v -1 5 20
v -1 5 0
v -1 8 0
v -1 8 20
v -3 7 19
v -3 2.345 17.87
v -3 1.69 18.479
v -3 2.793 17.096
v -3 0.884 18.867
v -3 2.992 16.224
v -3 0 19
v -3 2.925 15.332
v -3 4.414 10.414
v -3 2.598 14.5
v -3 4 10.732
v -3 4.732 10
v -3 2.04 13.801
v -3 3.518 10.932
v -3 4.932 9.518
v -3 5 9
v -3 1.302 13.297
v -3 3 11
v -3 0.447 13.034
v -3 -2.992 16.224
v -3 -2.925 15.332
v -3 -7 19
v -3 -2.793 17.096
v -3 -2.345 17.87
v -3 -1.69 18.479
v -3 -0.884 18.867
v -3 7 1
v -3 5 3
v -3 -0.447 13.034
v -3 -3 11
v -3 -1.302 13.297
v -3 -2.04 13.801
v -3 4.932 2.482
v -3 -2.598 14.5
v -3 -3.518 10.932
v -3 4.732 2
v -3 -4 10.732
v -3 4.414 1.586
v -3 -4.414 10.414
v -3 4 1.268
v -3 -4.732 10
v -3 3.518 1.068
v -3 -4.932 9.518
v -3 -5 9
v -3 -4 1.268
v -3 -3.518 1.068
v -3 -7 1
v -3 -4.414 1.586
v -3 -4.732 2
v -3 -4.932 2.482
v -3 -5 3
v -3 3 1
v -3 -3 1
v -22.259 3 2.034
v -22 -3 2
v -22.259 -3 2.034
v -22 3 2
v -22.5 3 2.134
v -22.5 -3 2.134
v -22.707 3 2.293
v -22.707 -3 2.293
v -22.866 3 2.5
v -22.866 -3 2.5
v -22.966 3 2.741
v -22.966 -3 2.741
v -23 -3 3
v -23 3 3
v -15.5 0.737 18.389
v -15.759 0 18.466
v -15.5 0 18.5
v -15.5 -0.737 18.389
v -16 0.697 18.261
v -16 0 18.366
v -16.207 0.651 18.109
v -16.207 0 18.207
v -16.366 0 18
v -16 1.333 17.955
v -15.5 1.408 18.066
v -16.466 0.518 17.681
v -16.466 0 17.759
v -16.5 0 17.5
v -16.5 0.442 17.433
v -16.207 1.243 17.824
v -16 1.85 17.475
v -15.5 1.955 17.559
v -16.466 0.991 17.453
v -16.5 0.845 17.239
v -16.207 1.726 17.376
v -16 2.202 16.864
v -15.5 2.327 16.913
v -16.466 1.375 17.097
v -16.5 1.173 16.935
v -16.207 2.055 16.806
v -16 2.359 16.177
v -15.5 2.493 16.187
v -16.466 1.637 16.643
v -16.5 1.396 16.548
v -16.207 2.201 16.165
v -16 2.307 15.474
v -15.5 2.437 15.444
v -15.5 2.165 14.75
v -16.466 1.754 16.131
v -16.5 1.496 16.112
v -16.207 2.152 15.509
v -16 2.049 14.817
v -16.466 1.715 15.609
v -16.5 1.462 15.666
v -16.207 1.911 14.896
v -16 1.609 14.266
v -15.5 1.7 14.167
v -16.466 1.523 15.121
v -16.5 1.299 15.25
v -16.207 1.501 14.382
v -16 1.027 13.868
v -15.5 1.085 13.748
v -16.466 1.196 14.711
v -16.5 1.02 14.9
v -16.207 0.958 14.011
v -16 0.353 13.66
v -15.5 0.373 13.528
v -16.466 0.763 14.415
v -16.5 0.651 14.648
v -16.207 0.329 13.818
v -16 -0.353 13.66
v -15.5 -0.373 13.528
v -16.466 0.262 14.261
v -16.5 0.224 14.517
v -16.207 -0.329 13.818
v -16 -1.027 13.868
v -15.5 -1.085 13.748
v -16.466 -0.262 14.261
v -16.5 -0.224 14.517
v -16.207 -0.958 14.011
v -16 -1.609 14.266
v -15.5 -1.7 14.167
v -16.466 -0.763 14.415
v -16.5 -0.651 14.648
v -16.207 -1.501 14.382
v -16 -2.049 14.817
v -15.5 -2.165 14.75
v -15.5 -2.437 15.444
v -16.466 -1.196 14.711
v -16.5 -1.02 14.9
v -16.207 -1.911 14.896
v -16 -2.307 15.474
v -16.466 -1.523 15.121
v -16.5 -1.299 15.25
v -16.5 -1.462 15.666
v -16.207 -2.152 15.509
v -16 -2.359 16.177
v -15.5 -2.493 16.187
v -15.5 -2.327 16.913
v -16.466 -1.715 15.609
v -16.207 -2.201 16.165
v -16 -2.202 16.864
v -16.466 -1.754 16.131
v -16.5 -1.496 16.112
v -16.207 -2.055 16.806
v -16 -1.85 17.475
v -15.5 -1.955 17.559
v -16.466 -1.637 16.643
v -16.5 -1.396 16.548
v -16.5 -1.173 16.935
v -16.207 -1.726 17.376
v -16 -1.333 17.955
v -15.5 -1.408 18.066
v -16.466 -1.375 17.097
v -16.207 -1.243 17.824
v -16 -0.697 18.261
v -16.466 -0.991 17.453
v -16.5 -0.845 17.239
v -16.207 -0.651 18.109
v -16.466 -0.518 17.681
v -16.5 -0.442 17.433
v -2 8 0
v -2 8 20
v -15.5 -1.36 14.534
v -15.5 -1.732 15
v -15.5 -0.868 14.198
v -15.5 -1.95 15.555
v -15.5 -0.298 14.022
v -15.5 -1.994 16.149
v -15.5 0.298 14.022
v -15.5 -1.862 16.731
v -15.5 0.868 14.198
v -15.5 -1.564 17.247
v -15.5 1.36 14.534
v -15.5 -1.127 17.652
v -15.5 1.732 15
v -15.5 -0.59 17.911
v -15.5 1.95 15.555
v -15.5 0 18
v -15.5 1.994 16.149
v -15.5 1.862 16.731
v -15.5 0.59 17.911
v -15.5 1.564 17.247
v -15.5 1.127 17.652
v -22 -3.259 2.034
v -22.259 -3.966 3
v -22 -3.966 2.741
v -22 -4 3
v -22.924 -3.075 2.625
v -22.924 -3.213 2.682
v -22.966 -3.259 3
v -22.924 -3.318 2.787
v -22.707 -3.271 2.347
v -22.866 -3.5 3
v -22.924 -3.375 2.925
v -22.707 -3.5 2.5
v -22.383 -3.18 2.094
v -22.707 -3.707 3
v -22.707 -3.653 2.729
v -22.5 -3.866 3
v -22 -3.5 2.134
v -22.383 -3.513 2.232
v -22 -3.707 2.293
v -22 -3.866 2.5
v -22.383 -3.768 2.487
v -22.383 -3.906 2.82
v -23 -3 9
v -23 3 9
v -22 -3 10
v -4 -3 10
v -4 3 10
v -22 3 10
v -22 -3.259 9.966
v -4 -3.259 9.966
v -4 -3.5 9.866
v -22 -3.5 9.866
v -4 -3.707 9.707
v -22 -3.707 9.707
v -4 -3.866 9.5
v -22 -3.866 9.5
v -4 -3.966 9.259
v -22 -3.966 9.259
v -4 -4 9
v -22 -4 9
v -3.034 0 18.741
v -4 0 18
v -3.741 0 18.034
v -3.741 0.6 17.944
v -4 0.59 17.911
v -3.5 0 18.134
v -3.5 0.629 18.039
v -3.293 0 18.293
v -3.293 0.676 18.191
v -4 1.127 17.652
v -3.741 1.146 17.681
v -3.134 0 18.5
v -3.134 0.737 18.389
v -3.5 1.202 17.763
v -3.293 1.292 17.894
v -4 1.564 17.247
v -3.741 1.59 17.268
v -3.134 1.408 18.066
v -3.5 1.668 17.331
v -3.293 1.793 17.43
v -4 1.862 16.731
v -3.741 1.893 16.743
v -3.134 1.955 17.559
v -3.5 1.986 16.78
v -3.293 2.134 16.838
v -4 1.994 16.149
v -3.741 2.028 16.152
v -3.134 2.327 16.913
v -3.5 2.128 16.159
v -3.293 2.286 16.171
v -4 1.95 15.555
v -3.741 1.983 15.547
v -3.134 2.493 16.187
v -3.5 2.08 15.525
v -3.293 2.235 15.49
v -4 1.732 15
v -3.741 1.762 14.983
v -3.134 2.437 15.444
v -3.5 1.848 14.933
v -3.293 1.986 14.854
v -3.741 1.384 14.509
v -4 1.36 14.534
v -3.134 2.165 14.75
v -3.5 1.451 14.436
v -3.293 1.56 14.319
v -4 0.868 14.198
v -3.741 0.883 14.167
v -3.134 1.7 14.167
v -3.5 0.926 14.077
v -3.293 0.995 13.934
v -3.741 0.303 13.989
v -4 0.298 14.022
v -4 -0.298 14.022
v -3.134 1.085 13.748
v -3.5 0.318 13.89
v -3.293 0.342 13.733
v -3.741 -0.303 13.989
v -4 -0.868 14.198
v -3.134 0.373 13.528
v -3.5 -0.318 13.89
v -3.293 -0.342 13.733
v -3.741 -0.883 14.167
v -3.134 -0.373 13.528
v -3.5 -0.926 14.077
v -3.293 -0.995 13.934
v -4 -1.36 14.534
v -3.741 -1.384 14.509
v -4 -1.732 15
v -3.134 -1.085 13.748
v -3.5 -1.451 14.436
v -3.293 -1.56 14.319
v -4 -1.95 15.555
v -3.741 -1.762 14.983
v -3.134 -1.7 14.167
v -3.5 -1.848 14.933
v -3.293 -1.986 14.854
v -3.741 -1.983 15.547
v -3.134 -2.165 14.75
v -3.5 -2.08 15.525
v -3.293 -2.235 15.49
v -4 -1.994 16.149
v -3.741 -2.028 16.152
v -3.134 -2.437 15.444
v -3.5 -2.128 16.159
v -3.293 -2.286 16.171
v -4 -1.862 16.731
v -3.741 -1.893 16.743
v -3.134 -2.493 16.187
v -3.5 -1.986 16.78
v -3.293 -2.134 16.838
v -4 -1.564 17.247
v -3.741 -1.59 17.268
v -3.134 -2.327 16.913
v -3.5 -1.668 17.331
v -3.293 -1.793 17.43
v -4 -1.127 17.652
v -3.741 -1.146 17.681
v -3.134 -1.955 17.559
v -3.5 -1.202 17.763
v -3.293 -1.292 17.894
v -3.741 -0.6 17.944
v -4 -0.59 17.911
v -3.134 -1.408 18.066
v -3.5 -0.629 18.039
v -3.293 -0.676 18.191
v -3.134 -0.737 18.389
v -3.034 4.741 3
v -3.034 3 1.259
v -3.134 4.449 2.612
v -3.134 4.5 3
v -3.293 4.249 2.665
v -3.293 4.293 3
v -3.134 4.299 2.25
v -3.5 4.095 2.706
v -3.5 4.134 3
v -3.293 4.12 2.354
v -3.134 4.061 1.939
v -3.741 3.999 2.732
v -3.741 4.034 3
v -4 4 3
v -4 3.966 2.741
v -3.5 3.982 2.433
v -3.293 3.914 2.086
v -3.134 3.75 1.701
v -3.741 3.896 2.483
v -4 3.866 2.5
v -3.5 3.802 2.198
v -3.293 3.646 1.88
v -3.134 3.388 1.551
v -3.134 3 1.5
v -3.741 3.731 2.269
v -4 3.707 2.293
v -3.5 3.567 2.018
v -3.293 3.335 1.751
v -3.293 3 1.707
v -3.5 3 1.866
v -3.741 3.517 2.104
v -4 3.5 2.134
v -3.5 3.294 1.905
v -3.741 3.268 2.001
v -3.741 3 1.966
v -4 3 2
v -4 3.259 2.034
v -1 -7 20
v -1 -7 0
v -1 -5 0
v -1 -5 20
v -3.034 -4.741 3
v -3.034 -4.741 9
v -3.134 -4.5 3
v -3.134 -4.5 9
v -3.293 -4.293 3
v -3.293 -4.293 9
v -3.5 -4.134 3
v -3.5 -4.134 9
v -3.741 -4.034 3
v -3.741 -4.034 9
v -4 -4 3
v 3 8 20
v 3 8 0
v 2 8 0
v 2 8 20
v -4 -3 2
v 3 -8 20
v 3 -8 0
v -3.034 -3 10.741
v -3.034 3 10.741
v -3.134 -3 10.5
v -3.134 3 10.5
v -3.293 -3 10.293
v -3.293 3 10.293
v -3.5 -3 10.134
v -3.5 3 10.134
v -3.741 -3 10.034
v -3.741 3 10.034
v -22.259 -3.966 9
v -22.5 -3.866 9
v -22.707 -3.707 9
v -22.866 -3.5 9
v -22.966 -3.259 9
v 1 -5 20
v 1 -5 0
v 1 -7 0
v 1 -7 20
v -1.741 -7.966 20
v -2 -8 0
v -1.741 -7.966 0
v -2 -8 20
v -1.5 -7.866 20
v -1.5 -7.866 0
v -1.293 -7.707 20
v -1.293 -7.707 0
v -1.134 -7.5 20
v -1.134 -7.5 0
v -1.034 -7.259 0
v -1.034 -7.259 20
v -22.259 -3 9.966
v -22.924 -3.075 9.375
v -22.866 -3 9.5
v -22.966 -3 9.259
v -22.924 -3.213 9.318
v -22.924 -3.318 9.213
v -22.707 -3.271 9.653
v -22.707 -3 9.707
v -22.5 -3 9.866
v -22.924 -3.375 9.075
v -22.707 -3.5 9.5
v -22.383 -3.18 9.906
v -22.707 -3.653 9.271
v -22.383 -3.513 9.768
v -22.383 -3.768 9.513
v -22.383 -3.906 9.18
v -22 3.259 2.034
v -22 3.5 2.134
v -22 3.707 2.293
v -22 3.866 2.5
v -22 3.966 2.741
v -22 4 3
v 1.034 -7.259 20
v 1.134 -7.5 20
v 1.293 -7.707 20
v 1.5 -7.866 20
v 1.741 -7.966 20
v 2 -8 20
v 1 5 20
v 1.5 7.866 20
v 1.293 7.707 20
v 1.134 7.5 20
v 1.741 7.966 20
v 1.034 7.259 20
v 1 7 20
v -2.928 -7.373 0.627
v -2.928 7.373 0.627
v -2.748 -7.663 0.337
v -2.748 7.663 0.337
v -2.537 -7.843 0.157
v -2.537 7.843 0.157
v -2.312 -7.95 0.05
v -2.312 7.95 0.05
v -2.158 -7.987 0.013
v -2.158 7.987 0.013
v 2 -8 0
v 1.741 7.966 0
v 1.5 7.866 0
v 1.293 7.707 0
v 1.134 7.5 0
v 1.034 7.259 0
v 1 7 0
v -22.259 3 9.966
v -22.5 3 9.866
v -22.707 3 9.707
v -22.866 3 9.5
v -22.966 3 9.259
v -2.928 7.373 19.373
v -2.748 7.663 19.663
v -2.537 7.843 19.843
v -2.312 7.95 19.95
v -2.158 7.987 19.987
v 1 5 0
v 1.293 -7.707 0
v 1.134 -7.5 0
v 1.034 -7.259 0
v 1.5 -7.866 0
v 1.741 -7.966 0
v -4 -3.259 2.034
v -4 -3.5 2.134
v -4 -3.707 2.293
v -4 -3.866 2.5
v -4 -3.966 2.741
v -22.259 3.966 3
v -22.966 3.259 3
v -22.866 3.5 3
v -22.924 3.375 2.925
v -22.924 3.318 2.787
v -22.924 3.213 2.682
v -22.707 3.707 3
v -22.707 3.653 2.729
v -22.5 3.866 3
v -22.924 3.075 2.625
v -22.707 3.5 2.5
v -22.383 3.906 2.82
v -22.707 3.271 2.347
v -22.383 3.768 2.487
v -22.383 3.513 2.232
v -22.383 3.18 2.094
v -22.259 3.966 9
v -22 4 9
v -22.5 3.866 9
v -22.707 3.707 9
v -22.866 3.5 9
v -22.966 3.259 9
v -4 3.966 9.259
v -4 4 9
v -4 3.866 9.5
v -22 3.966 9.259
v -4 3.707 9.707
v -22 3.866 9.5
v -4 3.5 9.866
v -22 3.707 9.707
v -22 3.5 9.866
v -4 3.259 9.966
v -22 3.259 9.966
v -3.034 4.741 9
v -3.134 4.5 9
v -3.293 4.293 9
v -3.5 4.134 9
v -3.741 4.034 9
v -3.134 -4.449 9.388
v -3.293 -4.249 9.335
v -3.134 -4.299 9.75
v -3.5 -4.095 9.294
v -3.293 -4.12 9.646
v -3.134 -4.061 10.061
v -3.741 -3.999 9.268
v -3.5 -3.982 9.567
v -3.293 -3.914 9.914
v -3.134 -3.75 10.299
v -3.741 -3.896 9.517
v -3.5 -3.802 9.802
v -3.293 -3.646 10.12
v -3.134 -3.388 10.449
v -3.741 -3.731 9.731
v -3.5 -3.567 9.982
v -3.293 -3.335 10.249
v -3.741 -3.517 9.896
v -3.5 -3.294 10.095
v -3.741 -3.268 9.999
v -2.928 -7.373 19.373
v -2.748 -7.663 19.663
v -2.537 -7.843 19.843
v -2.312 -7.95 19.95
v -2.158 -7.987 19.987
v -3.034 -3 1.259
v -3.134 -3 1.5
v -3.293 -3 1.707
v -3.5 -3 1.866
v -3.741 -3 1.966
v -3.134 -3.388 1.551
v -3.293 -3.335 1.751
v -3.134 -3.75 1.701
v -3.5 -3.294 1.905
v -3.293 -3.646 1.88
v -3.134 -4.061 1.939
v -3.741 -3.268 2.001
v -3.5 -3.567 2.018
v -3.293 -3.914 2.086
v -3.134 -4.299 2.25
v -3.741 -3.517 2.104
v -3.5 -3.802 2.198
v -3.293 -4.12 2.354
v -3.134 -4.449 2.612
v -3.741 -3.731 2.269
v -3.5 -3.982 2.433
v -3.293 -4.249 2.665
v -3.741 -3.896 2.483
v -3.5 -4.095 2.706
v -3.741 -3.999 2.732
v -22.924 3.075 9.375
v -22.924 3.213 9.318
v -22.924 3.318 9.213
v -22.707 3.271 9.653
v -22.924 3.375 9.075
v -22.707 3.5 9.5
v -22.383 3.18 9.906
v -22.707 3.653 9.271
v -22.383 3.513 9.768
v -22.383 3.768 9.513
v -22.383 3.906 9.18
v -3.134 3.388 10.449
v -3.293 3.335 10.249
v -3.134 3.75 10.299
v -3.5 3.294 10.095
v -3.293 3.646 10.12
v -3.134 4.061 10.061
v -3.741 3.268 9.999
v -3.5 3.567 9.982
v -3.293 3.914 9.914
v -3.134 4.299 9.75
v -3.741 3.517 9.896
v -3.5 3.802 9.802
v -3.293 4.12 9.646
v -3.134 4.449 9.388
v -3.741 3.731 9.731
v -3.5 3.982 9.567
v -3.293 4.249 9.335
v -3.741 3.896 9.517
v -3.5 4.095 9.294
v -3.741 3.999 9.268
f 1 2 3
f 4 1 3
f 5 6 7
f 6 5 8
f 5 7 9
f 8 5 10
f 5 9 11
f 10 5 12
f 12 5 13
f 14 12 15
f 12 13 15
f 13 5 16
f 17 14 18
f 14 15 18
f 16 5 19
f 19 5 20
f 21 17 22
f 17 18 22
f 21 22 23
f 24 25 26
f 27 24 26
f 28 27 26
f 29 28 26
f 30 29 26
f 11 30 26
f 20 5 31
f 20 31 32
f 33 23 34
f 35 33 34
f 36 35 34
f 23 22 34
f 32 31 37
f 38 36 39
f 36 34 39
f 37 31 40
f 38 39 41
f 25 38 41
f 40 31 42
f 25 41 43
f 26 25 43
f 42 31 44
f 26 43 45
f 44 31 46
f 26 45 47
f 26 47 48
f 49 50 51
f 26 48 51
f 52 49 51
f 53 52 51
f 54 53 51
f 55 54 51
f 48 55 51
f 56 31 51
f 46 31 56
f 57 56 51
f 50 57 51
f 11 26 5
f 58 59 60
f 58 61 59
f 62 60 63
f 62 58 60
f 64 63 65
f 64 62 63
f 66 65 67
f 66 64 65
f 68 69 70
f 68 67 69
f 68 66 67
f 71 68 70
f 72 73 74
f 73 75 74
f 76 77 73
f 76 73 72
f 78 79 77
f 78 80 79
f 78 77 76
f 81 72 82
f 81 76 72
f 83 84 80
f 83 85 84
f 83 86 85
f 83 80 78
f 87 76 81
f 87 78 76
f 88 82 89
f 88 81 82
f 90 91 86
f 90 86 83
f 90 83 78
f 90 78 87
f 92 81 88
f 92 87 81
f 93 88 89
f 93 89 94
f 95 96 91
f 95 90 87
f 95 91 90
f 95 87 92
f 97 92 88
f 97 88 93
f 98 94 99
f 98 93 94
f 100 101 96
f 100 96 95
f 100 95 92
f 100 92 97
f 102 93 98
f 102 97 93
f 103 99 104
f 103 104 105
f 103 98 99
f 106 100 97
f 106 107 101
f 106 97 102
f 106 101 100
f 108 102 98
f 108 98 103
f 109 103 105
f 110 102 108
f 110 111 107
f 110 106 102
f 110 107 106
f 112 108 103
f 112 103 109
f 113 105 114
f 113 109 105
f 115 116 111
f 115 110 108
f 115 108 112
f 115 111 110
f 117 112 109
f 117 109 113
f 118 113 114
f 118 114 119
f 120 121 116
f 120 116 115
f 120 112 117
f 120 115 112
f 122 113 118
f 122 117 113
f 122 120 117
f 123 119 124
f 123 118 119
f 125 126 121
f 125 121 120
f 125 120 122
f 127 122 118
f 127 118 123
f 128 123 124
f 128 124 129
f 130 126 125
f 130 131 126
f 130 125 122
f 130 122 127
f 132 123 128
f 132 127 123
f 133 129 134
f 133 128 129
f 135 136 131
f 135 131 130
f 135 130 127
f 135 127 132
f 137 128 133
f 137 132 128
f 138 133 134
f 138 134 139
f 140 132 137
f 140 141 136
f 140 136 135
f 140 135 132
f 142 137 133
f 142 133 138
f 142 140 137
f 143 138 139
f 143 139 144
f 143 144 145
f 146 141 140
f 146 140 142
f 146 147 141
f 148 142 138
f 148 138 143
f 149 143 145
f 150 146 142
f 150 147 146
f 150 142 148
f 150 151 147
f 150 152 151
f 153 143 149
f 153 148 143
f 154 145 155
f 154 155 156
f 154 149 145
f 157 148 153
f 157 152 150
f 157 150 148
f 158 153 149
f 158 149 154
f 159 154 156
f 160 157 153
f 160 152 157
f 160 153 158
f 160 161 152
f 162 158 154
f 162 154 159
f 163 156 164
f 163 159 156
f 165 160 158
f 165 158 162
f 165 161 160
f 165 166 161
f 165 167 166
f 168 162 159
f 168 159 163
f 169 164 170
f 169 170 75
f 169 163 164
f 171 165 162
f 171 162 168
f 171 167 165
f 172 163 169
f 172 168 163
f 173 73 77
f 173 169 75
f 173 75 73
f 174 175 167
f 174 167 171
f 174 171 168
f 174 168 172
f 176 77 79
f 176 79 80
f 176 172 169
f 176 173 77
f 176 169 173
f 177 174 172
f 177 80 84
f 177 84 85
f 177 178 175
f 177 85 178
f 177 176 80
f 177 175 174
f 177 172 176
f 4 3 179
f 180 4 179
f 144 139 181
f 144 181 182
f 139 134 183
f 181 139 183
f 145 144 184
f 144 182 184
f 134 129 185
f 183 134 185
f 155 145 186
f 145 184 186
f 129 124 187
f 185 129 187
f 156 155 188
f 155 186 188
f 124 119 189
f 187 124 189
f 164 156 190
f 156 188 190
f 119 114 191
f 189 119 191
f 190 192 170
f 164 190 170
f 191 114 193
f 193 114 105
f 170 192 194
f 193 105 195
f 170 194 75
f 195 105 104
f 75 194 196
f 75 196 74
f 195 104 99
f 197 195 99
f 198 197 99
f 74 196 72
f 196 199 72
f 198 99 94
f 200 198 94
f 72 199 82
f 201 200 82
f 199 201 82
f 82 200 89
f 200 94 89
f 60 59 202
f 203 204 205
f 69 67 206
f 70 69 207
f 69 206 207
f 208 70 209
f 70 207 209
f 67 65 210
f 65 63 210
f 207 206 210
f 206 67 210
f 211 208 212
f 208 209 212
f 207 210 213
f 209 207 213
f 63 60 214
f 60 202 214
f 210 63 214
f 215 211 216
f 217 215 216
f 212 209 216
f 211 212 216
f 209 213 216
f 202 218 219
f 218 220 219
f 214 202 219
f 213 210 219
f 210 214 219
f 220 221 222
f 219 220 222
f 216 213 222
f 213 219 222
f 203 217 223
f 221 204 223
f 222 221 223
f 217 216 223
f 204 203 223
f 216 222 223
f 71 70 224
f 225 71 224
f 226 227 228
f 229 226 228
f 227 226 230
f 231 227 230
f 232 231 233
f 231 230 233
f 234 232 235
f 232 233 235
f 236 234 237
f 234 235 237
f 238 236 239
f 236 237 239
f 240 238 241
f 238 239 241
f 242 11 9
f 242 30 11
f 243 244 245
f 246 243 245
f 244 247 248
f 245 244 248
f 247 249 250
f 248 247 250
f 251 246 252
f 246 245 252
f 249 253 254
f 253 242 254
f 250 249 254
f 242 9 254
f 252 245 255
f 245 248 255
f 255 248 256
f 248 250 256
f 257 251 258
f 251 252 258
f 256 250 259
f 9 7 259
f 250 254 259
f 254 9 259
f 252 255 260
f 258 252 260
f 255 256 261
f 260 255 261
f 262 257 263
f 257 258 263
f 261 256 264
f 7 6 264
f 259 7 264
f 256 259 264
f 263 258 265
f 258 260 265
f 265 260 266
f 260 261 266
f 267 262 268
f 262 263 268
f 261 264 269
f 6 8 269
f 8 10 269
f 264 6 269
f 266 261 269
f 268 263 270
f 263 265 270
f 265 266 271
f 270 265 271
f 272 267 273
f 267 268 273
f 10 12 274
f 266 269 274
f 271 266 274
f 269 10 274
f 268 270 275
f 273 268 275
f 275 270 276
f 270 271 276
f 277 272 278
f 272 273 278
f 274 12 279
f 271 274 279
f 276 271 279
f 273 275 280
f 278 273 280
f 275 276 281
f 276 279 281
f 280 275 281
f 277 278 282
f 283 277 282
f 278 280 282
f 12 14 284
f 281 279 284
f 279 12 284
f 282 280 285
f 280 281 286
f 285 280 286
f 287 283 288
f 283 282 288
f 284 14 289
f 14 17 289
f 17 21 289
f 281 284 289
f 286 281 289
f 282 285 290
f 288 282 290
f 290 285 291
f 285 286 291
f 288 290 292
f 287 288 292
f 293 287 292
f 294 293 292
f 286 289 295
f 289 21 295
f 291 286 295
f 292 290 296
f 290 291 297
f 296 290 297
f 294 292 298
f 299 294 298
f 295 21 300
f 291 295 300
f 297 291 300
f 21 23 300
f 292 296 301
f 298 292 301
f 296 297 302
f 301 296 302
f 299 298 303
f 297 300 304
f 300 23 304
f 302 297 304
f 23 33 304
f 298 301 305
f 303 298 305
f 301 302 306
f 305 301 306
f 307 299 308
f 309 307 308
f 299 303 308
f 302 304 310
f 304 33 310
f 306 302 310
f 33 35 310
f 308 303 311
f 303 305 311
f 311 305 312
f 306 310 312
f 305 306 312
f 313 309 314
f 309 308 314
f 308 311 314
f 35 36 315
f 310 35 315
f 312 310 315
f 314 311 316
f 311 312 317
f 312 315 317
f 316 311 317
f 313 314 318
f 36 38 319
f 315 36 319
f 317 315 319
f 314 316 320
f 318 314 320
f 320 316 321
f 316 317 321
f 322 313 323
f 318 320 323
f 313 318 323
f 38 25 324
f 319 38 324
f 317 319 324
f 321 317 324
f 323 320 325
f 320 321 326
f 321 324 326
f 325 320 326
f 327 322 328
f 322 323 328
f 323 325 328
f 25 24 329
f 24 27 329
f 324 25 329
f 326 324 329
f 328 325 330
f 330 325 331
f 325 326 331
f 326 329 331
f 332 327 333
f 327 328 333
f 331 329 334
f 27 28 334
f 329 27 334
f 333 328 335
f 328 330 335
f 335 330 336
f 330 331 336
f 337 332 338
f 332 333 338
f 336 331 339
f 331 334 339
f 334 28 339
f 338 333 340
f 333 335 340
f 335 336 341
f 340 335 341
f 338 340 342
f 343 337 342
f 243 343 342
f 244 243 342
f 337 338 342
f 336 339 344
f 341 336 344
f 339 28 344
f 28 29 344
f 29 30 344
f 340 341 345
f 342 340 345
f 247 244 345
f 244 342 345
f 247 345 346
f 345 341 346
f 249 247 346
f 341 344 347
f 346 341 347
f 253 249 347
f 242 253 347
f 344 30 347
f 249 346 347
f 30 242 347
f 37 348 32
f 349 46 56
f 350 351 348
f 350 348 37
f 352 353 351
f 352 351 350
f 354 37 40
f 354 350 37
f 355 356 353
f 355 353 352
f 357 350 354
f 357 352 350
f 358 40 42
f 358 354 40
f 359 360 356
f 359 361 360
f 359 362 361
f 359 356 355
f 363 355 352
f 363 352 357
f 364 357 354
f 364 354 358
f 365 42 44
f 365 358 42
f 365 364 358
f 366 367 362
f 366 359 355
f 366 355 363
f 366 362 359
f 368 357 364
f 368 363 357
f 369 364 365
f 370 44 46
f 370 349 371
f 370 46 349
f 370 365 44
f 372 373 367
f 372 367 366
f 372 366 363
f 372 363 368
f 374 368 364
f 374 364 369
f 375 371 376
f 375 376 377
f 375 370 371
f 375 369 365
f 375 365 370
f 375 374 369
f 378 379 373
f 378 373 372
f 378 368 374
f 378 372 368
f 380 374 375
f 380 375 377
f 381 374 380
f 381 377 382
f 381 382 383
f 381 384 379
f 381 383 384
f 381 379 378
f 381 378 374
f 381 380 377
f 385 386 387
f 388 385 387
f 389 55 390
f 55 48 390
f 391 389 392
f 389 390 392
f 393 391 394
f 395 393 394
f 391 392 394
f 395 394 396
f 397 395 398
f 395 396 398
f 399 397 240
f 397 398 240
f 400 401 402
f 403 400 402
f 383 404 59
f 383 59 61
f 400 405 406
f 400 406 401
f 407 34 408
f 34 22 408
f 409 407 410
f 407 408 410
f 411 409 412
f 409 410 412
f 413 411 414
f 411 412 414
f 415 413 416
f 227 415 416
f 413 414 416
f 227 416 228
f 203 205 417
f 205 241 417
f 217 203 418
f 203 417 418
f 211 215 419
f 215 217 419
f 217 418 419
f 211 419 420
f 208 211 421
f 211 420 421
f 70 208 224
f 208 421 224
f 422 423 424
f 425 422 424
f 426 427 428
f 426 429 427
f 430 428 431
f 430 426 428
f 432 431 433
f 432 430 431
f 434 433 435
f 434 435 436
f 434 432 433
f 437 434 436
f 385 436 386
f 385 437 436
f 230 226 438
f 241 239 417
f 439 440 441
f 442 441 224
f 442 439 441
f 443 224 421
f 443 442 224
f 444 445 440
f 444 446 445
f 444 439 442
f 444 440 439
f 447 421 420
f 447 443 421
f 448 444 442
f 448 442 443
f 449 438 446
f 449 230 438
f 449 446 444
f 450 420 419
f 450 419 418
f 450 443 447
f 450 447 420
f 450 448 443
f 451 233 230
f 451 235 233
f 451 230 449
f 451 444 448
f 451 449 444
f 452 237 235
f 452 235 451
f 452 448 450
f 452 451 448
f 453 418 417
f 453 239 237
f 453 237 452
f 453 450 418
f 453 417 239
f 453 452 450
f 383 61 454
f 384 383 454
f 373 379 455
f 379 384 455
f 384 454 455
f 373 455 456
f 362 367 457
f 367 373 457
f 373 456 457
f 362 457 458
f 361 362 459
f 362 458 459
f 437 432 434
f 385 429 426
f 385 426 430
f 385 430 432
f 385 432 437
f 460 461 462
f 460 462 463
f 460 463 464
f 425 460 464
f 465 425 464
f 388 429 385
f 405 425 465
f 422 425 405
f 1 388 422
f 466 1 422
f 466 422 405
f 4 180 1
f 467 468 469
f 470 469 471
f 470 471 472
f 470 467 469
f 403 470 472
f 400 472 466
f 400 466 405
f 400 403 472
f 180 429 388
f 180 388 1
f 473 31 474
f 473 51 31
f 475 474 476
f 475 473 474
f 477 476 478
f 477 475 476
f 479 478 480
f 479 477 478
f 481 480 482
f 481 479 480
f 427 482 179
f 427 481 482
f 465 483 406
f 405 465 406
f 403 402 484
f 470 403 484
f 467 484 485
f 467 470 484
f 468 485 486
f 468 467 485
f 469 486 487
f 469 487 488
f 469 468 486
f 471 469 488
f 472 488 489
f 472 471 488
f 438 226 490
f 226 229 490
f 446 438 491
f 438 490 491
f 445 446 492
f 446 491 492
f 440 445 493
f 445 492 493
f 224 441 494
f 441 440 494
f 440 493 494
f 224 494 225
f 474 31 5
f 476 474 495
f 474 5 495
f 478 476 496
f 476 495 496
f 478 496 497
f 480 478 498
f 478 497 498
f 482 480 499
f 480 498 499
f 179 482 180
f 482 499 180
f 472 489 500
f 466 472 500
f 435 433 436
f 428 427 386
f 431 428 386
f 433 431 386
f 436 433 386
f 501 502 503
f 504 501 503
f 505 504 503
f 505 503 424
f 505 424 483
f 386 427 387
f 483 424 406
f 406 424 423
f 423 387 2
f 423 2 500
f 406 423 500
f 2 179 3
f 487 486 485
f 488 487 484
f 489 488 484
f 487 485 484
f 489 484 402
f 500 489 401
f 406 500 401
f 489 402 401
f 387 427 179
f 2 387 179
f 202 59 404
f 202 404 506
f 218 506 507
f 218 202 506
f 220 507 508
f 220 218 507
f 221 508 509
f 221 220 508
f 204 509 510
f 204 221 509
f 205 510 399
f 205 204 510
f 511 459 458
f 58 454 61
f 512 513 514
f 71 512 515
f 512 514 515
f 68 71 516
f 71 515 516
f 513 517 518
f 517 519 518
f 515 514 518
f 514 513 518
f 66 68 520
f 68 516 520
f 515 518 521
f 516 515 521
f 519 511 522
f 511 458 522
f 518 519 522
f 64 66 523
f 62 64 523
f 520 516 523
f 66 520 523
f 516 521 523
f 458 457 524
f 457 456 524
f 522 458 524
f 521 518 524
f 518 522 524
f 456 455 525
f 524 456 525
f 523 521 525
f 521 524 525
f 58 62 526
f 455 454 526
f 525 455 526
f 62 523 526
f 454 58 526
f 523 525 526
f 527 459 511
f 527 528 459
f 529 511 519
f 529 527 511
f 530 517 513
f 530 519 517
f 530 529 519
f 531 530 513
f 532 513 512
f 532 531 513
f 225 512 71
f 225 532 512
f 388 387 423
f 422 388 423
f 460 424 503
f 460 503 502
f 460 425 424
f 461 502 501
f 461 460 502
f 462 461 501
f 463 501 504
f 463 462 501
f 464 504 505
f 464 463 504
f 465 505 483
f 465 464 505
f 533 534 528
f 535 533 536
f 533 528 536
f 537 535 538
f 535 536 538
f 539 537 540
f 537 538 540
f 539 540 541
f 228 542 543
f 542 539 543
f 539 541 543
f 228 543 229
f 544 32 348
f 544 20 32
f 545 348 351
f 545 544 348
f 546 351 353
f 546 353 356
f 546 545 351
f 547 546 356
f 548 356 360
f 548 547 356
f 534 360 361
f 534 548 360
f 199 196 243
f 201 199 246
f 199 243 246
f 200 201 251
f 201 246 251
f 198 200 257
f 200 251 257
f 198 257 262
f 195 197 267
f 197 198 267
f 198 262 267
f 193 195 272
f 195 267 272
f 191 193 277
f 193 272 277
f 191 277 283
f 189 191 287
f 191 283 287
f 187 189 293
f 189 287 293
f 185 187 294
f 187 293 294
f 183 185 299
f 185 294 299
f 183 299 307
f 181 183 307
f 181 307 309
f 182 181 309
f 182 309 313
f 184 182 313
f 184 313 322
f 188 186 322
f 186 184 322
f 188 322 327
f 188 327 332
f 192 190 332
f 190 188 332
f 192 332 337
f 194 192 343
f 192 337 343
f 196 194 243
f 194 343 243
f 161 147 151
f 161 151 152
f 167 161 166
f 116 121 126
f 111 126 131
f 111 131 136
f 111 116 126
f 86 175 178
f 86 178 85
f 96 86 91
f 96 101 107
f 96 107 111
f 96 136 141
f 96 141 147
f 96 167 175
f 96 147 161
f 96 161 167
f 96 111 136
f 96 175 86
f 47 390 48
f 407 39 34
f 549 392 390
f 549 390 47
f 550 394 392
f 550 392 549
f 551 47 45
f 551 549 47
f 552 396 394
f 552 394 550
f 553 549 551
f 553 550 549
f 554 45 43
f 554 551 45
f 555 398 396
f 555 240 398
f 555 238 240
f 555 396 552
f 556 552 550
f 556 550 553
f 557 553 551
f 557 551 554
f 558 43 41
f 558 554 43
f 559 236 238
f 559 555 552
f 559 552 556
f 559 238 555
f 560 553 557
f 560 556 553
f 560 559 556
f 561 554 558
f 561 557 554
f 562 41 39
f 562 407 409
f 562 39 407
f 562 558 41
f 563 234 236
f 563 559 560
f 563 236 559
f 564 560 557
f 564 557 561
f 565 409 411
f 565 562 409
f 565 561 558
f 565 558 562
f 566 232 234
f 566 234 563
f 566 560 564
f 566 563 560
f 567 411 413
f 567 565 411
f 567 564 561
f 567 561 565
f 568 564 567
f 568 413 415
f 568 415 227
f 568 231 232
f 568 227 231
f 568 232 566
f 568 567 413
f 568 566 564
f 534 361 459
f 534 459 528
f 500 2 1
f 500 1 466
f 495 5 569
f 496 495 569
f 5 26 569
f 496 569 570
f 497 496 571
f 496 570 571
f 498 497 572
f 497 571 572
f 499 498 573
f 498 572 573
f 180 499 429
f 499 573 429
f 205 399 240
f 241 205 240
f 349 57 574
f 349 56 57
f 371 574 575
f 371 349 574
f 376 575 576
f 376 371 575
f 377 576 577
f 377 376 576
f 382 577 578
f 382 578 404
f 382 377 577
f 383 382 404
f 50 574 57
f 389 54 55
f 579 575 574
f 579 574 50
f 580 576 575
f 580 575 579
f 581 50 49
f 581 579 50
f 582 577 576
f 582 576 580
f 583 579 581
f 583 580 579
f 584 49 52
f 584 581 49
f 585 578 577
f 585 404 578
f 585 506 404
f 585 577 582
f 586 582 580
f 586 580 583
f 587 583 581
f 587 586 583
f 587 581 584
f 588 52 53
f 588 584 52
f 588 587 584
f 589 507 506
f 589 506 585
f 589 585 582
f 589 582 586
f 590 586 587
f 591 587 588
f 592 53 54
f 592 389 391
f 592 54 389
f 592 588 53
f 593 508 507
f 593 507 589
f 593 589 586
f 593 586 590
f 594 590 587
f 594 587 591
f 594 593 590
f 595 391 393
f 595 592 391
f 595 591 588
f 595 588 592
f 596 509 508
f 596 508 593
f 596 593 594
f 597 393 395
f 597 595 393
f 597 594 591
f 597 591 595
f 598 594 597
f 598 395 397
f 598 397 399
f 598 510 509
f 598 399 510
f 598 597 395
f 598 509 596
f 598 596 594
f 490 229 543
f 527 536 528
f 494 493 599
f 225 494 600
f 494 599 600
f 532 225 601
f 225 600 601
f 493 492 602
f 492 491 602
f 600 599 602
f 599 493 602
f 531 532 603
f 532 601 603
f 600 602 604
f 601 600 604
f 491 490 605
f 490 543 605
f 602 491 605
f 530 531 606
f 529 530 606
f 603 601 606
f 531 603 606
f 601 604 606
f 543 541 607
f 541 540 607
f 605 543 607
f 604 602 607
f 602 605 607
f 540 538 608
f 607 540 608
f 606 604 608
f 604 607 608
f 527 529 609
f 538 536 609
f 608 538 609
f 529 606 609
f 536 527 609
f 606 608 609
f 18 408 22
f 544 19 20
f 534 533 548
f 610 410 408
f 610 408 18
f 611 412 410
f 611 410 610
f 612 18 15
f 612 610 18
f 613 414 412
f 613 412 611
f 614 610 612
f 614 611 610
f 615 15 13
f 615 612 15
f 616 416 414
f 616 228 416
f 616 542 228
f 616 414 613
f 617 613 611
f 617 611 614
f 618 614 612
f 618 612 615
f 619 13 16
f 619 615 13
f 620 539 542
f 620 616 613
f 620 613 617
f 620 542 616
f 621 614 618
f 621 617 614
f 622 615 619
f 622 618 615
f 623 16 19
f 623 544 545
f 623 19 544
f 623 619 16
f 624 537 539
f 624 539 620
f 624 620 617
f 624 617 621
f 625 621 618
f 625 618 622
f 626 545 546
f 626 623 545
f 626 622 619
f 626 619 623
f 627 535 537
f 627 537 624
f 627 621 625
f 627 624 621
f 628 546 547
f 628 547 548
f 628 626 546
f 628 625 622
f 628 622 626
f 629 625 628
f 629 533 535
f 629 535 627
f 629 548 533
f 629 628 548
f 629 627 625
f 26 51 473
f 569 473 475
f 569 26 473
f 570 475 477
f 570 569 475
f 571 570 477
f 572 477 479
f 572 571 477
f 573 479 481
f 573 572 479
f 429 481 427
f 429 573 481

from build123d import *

# Parameters (mm, degrees)
SKETCH1_W           = 2
SKETCH1_H           = 10
BOSS_EXTRUDE1_DEPTH = 20
SKETCH2_R           = 2
BOSS_EXTRUDE2_DEPTH = 13.5
SKETCH3_R           = 2.5
BOSS_EXTRUDE3_DEPTH = 1
SKETCH4_W           = 8
SKETCH4_H           = 8
BOSS_EXTRUDE4_DEPTH = 20
FILLET1_R           = 1


with BuildPart() as part:
    # Sketch1 → Boss-Extrude1 (new body)
    with BuildSketch(Plane.XY):
        Polygon((-1, -8), (-1, -5), (-1, 5), (-1, 8), (-3, 8), (-3, -8), align=None)
        Rectangle(SKETCH1_W, SKETCH1_H)
        Polygon((1, 5), (1, -5), (1, -8), (3, -8), (3, 8), (1, 8), align=None)
    extrude(amount=BOSS_EXTRUDE1_DEPTH)

    # Sketch2 → Boss-Extrude2 (add)
    with BuildSketch(Plane.ZY.offset(3)):
        with Locations((16, 0)):
            Circle(SKETCH2_R)
    extrude(amount=BOSS_EXTRUDE2_DEPTH)

    # Sketch3 → Boss-Extrude3 (add)
    with BuildSketch(Plane.ZY.offset(16.5)):
        with Locations((16, 0)):
            Circle(SKETCH3_R)
    extrude(amount=-BOSS_EXTRUDE3_DEPTH)

    # Sketch4 → Boss-Extrude4 (add)
    with BuildSketch(Plane.ZY.offset(3)):
        with Locations((6, 0)):
            Rectangle(SKETCH4_W, SKETCH4_H)
    extrude(amount=BOSS_EXTRUDE4_DEPTH)

    # Fillet1
    fillet1_edges = [part.edges().sort_by_distance(p)[0] for p in [
        (-3, 0, 0),
        (-3, -8, 10),
        (-3, 8, 10),
        (1, 8, 10),
        (1, -8, 10),
        (-1, -8, 10),
        (-3, 0, 14),
        (-16.5, 0, 13.5),
        (-3, 0, 20),
        (-3, 0, 10),
        (-13, -4, 10),
        (-3, 4, 6),
        (-13, 4, 10),
        (-3, 0, 2),
        (-13, 4, 2),
        (-3, -4, 6),
        (-13, -4, 2),
        (-23, 0, 10),
        (-23, 4, 6),
        (-23, 0, 2),
        (-23, -4, 6),
    ]]
    fillet(fillet1_edges, radius=FILLET1_R - 0.0001)  # a hair under: the kernel refuses the full size


solid = part.part
